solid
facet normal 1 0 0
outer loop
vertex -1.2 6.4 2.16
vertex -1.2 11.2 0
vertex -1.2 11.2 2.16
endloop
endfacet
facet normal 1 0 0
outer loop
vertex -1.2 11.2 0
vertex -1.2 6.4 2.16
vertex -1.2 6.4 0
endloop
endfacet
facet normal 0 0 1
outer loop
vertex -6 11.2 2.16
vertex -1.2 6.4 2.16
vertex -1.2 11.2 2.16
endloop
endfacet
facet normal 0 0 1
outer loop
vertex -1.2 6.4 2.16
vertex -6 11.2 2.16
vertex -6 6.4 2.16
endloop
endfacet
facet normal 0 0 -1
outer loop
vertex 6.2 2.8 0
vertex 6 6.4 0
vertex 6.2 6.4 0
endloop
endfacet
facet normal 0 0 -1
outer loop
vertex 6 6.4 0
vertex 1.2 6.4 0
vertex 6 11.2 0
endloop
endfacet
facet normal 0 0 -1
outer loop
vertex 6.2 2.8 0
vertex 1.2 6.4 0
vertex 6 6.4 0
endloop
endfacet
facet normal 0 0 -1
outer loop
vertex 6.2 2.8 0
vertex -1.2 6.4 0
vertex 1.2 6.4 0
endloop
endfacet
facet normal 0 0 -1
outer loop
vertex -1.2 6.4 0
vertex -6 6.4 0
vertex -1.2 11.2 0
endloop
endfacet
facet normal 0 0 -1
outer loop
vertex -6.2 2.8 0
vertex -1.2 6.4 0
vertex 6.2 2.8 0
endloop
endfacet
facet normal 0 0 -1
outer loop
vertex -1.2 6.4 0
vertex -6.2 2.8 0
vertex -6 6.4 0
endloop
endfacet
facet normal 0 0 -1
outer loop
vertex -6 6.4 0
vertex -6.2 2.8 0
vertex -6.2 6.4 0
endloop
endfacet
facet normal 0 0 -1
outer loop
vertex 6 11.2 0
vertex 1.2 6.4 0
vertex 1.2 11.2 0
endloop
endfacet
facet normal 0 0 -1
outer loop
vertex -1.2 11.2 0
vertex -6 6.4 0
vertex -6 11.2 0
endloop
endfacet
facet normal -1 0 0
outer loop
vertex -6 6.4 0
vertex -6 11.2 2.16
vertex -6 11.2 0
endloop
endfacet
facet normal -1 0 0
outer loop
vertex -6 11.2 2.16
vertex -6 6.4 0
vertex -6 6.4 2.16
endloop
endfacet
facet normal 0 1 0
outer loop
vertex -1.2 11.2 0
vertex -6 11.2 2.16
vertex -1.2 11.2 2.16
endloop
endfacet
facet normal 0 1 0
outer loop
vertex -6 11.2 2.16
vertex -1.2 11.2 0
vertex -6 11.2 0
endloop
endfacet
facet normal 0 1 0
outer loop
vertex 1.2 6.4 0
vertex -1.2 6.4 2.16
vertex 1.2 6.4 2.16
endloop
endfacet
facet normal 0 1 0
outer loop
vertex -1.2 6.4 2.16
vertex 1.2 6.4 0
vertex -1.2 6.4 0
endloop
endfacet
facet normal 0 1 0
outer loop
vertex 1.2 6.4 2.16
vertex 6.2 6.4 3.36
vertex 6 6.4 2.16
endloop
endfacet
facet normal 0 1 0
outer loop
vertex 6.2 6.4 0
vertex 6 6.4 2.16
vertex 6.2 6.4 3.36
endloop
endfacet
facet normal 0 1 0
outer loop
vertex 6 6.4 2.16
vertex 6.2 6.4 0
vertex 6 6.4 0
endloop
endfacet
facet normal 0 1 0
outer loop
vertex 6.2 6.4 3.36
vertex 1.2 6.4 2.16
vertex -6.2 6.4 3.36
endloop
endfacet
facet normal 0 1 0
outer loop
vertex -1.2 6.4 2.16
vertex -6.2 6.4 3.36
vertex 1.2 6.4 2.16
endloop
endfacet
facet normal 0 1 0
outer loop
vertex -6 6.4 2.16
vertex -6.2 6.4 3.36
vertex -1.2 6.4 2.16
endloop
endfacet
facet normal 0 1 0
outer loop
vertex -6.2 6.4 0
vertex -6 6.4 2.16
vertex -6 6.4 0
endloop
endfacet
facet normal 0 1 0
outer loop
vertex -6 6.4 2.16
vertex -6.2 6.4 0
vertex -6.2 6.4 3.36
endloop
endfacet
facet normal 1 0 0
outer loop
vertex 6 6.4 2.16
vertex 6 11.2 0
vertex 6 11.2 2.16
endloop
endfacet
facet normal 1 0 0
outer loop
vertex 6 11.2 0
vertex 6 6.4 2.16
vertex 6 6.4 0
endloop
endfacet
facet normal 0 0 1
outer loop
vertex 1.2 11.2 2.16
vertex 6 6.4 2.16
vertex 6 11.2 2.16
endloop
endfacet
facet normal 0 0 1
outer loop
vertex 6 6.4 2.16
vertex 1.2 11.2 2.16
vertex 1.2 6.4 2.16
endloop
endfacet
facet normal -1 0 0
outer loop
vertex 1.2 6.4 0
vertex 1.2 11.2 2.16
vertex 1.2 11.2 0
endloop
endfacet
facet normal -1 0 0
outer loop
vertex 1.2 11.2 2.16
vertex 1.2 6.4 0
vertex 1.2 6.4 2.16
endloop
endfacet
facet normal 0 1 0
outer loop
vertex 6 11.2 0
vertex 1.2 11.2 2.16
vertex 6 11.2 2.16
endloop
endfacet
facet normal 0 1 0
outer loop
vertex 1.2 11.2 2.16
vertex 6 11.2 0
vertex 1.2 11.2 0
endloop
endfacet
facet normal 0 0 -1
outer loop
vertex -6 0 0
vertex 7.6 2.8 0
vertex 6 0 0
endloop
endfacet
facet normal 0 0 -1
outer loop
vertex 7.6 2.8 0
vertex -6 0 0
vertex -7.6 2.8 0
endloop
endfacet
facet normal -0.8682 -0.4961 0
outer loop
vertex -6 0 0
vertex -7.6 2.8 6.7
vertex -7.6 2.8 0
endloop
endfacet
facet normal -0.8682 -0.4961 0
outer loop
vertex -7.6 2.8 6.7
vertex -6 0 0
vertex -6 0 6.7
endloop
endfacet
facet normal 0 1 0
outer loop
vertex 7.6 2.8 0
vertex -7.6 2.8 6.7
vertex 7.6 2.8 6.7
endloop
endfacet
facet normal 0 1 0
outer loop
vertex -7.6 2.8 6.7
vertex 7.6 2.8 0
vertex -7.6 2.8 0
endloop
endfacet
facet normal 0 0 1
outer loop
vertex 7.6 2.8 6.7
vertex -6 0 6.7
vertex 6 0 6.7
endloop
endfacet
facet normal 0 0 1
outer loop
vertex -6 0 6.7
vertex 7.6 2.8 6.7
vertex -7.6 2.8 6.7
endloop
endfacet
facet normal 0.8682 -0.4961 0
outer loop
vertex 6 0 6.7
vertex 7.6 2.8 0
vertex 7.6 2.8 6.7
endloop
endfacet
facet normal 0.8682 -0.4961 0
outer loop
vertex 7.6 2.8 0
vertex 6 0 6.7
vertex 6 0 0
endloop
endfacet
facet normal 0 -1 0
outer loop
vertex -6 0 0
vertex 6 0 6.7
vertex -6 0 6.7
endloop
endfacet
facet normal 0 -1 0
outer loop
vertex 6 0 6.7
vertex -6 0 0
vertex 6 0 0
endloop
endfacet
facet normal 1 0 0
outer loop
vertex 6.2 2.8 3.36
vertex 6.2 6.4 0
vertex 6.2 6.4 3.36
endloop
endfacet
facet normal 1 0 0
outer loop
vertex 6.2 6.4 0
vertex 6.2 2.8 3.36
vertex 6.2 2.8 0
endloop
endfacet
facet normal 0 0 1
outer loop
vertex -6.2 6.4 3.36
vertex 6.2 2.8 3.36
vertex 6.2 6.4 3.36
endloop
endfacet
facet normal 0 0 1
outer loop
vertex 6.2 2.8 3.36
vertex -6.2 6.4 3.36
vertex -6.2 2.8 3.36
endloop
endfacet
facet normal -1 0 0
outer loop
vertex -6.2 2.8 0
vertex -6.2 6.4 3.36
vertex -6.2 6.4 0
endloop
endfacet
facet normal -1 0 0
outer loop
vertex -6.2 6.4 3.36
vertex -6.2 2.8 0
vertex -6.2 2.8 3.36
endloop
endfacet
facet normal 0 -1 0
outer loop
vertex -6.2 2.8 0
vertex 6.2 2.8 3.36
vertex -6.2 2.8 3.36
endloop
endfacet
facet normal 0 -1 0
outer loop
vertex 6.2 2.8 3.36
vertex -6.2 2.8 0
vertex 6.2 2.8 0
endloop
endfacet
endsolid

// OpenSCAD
base_width = 2.8;
middle_width = 3.6;

part();


module part(){
	base();
	middle();
	connectors();
}


module connectors(){
	height = 2.16;
	width = 4.8;
	
	xAbs = 3.6;
	for(x = [-xAbs, xAbs]){
		translate([x, base_width+middle_width+width/2, height/2])
			cube([4.8, width, height], center=true);
	}
}


module middle(){
	height = 3.36;
	translate([0, base_width+middle_width/2, height/2])
		cube([12.4, middle_width, height], center=true);
}


module base(){
	linear_extrude(6.7){
		base_2d_half();
		mirror([1, 0, 0]) base_2d_half();
	}

	module base_2d_half(){
		polygon([[0,0], [6,0], [7.6,base_width], [0,base_width]]);
	}	
}
